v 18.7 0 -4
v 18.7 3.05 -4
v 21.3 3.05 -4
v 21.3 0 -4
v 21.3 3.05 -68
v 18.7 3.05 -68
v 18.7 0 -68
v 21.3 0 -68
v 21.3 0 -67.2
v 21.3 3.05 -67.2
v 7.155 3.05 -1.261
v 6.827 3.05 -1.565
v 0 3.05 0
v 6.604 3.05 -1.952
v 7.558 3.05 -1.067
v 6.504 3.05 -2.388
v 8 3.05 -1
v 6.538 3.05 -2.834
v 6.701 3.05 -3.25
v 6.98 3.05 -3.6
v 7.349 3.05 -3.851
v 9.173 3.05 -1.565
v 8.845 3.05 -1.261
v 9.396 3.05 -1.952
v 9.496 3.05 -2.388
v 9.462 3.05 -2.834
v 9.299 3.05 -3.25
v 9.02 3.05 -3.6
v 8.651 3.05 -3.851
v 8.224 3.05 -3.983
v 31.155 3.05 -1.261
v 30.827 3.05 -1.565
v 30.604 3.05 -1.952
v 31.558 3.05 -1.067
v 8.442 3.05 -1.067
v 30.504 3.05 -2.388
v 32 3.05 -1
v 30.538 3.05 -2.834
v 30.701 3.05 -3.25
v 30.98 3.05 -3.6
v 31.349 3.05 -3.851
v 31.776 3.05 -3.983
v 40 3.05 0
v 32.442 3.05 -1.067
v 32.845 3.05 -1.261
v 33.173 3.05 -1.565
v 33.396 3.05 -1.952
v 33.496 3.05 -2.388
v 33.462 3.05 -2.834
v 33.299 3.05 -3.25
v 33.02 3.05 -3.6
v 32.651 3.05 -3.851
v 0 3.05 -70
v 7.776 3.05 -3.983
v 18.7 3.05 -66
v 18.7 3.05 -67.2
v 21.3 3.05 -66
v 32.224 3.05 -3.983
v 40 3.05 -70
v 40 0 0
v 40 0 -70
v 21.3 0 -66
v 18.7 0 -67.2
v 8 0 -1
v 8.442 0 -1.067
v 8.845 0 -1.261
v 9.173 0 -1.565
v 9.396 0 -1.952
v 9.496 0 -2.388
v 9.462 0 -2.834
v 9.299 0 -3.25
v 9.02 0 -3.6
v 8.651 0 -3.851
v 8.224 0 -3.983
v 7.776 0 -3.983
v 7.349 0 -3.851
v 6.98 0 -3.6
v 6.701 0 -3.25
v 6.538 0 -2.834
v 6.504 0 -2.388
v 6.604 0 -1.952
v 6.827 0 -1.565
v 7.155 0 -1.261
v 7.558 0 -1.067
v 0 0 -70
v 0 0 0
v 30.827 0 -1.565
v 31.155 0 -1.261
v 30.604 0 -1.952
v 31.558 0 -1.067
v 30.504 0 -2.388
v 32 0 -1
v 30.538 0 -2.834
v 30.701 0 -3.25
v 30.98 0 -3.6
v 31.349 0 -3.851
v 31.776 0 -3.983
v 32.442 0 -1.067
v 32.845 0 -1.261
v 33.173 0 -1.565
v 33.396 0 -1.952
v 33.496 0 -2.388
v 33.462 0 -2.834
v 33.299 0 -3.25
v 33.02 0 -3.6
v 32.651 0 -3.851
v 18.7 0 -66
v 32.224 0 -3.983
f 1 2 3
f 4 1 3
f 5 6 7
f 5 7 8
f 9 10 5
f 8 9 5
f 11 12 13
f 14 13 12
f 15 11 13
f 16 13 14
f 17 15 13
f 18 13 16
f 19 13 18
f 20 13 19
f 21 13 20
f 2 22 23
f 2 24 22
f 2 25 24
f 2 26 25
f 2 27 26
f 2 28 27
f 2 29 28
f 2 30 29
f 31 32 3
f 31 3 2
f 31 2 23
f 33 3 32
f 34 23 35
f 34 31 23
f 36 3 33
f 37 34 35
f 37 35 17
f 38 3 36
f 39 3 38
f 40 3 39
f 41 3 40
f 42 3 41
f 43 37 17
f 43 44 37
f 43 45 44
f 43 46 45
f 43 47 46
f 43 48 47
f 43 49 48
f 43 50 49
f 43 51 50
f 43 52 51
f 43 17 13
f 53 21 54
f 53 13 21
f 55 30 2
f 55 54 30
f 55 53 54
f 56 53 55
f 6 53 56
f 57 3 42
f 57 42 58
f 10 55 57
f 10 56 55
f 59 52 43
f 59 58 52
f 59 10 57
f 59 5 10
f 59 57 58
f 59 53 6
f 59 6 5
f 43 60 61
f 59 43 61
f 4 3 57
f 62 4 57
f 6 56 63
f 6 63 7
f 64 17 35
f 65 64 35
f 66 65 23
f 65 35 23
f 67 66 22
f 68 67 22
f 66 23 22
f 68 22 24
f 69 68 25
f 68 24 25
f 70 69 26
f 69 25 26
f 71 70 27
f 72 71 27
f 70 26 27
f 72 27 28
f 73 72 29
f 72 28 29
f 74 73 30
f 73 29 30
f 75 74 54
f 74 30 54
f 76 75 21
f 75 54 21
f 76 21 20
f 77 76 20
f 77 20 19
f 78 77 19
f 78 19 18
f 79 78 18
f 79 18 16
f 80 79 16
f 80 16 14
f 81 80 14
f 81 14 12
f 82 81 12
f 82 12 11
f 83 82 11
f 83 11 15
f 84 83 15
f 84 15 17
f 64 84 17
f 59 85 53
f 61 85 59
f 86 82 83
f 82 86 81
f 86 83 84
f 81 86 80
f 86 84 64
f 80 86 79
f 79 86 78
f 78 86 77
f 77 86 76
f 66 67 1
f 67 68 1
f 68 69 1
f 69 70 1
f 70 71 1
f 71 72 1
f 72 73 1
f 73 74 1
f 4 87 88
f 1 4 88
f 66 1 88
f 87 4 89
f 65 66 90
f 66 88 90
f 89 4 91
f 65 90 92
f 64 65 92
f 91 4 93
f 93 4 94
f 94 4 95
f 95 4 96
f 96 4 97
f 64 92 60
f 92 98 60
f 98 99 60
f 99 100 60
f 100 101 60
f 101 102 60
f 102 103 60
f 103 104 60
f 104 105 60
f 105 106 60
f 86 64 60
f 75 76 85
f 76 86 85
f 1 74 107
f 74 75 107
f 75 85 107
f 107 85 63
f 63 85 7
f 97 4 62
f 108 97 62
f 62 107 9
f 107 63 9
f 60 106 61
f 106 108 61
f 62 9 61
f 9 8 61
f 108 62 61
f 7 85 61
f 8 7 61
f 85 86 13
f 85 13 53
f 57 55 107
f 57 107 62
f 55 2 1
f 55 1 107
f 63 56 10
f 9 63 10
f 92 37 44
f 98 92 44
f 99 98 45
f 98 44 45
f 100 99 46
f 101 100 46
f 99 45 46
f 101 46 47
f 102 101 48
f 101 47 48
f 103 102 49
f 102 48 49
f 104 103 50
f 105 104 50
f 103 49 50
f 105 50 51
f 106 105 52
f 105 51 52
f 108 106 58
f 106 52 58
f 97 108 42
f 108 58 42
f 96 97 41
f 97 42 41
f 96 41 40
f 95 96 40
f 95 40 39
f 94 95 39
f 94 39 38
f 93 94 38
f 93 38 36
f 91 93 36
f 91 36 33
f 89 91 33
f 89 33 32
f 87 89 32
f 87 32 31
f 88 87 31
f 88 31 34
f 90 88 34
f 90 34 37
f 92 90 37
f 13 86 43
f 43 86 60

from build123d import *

# Parameters (mm, degrees)
SKETCH1_W           = 40
SKETCH1_H           = 70
BOSS_EXTRUDE1_DEPTH = 3.05
SKETCH4_W           = 2.6
SKETCH4_H           = 62
SKETCH4_H_2         = 0.8
CUT_EXTRUDE1_DEPTH  = 10
SKETCH7_R           = 1.5
CUT_EXTRUDE4_DEPTH  = 10


with BuildPart() as part:
    # Sketch1 → Boss-Extrude1 (new body)
    with BuildSketch(Plane(origin=(0, 0, 0), x_dir=(1, 0, 0), z_dir=(0, 1, 0))):
        with Locations((20, 35)):
            Rectangle(SKETCH1_W, SKETCH1_H)
    extrude(amount=BOSS_EXTRUDE1_DEPTH)

    # Sketch4 → Cut-Extrude1 (cut)
    with BuildSketch(Plane(origin=(0, 3.05, 0), x_dir=(1, 0, 0), z_dir=(0, 1, 0))):
        with Locations((20, 35)):
            Rectangle(SKETCH4_W, SKETCH4_H)
        with Locations((20, 67.6)):
            Rectangle(SKETCH4_W, SKETCH4_H_2)
    extrude(amount=-CUT_EXTRUDE1_DEPTH, mode=Mode.SUBTRACT)

    # Sketch7 → Cut-Extrude4 (cut)
    with BuildSketch(Plane(origin=(0, 3.05, 0), x_dir=(1, 0, 0), z_dir=(0, 1, 0))):
        with Locations(Location((8, 2.5, 0), (0, 0, 270))):
            Circle(SKETCH7_R)
        with Locations(Location((32, 2.5, 0), (0, 0, 270))):
            Circle(SKETCH7_R)
    extrude(amount=-CUT_EXTRUDE4_DEPTH, mode=Mode.SUBTRACT)


solid = part.part
